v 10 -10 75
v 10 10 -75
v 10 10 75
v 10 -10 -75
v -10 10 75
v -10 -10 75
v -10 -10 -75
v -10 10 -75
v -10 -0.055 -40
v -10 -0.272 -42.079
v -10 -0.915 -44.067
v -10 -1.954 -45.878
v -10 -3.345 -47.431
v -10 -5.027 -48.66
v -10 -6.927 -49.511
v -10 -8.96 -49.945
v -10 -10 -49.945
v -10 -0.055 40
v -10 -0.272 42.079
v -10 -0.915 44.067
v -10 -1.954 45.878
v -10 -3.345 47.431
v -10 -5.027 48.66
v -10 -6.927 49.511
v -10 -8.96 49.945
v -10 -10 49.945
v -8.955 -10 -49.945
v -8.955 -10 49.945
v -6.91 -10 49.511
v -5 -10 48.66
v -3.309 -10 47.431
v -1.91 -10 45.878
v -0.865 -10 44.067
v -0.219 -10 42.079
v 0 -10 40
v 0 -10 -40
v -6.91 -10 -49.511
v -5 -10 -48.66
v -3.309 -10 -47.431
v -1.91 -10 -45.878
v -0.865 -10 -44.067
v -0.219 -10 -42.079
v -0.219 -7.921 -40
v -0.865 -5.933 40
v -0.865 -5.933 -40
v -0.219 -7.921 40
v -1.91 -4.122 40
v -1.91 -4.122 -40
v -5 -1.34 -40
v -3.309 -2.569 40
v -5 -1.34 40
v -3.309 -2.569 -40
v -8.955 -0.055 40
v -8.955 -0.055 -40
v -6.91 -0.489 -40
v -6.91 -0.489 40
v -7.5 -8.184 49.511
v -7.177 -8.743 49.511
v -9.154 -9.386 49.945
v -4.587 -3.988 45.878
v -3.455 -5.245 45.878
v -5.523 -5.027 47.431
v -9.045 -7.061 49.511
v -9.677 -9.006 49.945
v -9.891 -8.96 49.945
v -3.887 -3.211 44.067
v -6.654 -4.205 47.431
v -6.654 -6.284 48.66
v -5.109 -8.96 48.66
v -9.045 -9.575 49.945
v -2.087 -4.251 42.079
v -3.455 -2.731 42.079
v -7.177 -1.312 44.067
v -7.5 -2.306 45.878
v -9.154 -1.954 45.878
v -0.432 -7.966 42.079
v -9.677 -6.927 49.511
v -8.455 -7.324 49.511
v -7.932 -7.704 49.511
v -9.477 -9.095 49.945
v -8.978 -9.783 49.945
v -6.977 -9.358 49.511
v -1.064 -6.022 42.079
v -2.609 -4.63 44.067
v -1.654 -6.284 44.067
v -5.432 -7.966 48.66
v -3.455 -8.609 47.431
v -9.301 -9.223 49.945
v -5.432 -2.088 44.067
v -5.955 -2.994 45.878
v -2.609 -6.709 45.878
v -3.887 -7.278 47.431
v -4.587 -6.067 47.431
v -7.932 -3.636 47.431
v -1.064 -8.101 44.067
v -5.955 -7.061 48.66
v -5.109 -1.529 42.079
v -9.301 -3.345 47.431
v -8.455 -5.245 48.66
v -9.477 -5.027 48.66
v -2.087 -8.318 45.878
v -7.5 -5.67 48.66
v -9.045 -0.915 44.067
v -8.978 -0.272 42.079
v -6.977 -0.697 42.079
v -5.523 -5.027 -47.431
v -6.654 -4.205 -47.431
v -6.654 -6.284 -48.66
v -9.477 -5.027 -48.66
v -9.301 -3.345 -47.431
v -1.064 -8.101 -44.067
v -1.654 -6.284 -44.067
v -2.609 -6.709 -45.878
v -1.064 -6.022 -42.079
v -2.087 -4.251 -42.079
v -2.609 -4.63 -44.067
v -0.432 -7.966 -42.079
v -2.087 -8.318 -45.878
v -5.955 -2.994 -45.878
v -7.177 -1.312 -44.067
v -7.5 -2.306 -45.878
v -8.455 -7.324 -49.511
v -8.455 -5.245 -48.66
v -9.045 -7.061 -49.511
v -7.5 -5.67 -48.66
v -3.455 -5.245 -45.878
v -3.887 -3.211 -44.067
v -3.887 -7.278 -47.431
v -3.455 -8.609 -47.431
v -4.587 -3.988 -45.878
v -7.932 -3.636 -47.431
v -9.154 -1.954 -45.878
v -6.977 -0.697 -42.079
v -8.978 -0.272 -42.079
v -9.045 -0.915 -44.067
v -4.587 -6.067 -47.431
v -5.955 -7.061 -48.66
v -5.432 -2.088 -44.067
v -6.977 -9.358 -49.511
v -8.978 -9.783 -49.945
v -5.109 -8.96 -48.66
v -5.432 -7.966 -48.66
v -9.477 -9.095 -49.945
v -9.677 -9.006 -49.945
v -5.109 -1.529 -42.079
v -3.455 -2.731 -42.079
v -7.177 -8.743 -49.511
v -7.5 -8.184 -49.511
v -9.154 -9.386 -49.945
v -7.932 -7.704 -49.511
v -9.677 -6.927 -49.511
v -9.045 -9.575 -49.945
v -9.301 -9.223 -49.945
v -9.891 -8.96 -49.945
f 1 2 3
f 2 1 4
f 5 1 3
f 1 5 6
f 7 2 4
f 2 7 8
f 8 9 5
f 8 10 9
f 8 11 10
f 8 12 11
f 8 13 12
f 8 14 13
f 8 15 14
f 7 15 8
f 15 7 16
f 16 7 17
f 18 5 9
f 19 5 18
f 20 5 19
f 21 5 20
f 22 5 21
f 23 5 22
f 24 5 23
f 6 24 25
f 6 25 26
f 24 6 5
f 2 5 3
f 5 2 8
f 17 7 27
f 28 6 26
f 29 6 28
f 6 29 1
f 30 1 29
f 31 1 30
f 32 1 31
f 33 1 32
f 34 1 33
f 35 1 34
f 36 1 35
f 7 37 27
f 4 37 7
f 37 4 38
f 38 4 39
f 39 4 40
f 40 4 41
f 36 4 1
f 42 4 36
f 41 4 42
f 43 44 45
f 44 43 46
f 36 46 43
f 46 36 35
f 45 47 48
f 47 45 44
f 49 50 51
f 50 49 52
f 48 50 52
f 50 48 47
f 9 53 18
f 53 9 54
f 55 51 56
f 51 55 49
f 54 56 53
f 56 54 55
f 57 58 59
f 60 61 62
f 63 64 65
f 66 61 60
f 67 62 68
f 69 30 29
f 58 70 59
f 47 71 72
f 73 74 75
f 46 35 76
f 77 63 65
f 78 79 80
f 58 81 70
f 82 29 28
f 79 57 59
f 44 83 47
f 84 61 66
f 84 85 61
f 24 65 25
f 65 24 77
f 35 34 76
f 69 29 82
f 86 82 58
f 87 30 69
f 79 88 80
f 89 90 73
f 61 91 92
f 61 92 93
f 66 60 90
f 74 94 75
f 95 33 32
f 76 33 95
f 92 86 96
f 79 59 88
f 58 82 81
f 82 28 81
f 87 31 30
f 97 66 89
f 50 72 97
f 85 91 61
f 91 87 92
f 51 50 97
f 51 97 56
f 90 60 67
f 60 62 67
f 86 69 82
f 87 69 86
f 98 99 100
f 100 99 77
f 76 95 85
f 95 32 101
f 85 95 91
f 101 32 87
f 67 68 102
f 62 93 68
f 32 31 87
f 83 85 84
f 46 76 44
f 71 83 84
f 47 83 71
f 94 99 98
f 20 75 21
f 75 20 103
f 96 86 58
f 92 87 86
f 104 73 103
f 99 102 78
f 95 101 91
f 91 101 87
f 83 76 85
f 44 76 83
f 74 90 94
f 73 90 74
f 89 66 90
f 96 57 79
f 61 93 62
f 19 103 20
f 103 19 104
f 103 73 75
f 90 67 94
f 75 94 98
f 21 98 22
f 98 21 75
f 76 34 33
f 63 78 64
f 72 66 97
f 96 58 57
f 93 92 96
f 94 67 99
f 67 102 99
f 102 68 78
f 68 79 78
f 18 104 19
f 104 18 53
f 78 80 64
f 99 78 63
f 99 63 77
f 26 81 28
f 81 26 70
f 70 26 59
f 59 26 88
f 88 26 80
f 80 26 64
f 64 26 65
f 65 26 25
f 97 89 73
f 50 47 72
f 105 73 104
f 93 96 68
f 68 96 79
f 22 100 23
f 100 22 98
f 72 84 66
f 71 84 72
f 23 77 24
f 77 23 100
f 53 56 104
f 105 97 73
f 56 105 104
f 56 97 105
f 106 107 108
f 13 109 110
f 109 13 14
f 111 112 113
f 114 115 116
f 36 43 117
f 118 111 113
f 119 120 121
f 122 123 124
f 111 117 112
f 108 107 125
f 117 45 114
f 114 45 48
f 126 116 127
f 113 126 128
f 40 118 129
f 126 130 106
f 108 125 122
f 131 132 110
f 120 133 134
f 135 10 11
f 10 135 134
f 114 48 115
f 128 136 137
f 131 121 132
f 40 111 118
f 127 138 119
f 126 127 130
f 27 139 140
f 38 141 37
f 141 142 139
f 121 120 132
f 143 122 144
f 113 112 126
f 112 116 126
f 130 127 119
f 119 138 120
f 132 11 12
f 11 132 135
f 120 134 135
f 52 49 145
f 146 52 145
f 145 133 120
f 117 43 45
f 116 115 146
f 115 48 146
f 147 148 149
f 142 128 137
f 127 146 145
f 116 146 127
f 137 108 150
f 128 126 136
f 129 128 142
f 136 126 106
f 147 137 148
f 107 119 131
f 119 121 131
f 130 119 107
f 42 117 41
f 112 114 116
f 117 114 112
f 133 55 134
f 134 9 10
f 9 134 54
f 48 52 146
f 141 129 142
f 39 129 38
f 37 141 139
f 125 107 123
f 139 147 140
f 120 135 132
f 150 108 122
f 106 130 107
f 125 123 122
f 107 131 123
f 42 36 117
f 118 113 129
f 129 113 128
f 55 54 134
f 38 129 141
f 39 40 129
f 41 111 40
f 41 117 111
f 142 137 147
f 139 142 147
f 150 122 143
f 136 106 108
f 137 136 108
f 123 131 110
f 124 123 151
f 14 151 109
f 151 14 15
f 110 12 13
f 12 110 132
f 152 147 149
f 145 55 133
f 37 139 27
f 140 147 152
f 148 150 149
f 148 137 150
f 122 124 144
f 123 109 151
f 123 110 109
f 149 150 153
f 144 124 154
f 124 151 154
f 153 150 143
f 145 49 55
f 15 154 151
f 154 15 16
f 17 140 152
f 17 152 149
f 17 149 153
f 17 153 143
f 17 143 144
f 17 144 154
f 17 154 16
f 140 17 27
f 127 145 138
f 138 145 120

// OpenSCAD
// Unit of length: Unit.MM
render(convexity = 2)
{
   difference()
   {
      cube(size = [20.0, 20.0, 150.0], center = true);
      translate(v = [-10.0, -10.0, 0.0])
      {
         cylinder(h = 80.0, d = 20.0, center = true);
      }
      translate(v = [-10.0, -10.0, 40.0])
      {
         sphere(d = 20.0);
      }
      translate(v = [-10.0, -10.0, -40.0])
      {
         sphere(d = 20.0);
      }
   }
}
